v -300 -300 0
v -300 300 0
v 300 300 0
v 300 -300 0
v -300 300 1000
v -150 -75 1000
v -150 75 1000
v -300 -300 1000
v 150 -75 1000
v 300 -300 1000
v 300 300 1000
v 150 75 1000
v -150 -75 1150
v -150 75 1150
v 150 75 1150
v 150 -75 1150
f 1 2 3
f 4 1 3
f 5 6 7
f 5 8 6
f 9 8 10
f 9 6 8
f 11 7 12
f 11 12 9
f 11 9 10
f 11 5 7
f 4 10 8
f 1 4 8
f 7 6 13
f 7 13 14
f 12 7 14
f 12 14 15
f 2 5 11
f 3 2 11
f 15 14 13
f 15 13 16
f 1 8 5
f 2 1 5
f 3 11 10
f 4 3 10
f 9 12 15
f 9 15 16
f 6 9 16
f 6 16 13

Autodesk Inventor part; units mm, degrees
ref_plane "YZ Plane" through (0, 0, 0) normal (1, 0, 0) x (0, 1, 0)
ref_plane "XZ Plane" through (0, 0, 0) normal (0, 1, 0) x (-1, 0, 0)
ref_plane "XY Plane" through (0, 0, 0) normal (0, 0, 1) x (1, 0, 0)
sketch "Sketch1" plane through (0, 0, 0) normal (0, 0, 1) x (1, 0, 0)
  line L0 (-300, 300) -> (300, 300)
  line L1 (300, 300) -> (300, -300)
  line L2 (300, -300) -> (-300, -300)
  line L3 (-300, -300) -> (-300, 300)
  line L4 (-300, -300) -> (300, 300) construction
  point P0 (0, 0)
  point P1 (0, 0)
  dimension "d0" = 600
  dimension "d1" = 600
extrude "Extrusion1" add sketch "Sketch1" along normal blind 1000
sketch "Sketch2" plane through (0, 0, 1000) normal (0, 0, 1) x (1, 0, 0)
  line L0 (-150, 75) -> (150, 75)
  line L1 (150, 75) -> (150, -75)
  line L2 (150, -75) -> (-150, -75)
  line L3 (-150, -75) -> (-150, 75)
  line L4 (-150, 75) -> (150, -75) construction
  line L5 (150, 75) -> (-150, -75) construction
  point P0 (0, 0)
  dimension "d4" = 300
  dimension "d5" = 150
extrude "Extrusion2" add sketch "Sketch2" along normal blind 150
equation "\"d0\" = Длина"
equation "\"d1\" = Ширина"
equation "\"d2\" = Высота"
equation "\"Длина\" = 600"
equation "\"Ширина\" = 600"
equation "\"Высота\" = 1000"
properties part number "Coagulant barrel"
